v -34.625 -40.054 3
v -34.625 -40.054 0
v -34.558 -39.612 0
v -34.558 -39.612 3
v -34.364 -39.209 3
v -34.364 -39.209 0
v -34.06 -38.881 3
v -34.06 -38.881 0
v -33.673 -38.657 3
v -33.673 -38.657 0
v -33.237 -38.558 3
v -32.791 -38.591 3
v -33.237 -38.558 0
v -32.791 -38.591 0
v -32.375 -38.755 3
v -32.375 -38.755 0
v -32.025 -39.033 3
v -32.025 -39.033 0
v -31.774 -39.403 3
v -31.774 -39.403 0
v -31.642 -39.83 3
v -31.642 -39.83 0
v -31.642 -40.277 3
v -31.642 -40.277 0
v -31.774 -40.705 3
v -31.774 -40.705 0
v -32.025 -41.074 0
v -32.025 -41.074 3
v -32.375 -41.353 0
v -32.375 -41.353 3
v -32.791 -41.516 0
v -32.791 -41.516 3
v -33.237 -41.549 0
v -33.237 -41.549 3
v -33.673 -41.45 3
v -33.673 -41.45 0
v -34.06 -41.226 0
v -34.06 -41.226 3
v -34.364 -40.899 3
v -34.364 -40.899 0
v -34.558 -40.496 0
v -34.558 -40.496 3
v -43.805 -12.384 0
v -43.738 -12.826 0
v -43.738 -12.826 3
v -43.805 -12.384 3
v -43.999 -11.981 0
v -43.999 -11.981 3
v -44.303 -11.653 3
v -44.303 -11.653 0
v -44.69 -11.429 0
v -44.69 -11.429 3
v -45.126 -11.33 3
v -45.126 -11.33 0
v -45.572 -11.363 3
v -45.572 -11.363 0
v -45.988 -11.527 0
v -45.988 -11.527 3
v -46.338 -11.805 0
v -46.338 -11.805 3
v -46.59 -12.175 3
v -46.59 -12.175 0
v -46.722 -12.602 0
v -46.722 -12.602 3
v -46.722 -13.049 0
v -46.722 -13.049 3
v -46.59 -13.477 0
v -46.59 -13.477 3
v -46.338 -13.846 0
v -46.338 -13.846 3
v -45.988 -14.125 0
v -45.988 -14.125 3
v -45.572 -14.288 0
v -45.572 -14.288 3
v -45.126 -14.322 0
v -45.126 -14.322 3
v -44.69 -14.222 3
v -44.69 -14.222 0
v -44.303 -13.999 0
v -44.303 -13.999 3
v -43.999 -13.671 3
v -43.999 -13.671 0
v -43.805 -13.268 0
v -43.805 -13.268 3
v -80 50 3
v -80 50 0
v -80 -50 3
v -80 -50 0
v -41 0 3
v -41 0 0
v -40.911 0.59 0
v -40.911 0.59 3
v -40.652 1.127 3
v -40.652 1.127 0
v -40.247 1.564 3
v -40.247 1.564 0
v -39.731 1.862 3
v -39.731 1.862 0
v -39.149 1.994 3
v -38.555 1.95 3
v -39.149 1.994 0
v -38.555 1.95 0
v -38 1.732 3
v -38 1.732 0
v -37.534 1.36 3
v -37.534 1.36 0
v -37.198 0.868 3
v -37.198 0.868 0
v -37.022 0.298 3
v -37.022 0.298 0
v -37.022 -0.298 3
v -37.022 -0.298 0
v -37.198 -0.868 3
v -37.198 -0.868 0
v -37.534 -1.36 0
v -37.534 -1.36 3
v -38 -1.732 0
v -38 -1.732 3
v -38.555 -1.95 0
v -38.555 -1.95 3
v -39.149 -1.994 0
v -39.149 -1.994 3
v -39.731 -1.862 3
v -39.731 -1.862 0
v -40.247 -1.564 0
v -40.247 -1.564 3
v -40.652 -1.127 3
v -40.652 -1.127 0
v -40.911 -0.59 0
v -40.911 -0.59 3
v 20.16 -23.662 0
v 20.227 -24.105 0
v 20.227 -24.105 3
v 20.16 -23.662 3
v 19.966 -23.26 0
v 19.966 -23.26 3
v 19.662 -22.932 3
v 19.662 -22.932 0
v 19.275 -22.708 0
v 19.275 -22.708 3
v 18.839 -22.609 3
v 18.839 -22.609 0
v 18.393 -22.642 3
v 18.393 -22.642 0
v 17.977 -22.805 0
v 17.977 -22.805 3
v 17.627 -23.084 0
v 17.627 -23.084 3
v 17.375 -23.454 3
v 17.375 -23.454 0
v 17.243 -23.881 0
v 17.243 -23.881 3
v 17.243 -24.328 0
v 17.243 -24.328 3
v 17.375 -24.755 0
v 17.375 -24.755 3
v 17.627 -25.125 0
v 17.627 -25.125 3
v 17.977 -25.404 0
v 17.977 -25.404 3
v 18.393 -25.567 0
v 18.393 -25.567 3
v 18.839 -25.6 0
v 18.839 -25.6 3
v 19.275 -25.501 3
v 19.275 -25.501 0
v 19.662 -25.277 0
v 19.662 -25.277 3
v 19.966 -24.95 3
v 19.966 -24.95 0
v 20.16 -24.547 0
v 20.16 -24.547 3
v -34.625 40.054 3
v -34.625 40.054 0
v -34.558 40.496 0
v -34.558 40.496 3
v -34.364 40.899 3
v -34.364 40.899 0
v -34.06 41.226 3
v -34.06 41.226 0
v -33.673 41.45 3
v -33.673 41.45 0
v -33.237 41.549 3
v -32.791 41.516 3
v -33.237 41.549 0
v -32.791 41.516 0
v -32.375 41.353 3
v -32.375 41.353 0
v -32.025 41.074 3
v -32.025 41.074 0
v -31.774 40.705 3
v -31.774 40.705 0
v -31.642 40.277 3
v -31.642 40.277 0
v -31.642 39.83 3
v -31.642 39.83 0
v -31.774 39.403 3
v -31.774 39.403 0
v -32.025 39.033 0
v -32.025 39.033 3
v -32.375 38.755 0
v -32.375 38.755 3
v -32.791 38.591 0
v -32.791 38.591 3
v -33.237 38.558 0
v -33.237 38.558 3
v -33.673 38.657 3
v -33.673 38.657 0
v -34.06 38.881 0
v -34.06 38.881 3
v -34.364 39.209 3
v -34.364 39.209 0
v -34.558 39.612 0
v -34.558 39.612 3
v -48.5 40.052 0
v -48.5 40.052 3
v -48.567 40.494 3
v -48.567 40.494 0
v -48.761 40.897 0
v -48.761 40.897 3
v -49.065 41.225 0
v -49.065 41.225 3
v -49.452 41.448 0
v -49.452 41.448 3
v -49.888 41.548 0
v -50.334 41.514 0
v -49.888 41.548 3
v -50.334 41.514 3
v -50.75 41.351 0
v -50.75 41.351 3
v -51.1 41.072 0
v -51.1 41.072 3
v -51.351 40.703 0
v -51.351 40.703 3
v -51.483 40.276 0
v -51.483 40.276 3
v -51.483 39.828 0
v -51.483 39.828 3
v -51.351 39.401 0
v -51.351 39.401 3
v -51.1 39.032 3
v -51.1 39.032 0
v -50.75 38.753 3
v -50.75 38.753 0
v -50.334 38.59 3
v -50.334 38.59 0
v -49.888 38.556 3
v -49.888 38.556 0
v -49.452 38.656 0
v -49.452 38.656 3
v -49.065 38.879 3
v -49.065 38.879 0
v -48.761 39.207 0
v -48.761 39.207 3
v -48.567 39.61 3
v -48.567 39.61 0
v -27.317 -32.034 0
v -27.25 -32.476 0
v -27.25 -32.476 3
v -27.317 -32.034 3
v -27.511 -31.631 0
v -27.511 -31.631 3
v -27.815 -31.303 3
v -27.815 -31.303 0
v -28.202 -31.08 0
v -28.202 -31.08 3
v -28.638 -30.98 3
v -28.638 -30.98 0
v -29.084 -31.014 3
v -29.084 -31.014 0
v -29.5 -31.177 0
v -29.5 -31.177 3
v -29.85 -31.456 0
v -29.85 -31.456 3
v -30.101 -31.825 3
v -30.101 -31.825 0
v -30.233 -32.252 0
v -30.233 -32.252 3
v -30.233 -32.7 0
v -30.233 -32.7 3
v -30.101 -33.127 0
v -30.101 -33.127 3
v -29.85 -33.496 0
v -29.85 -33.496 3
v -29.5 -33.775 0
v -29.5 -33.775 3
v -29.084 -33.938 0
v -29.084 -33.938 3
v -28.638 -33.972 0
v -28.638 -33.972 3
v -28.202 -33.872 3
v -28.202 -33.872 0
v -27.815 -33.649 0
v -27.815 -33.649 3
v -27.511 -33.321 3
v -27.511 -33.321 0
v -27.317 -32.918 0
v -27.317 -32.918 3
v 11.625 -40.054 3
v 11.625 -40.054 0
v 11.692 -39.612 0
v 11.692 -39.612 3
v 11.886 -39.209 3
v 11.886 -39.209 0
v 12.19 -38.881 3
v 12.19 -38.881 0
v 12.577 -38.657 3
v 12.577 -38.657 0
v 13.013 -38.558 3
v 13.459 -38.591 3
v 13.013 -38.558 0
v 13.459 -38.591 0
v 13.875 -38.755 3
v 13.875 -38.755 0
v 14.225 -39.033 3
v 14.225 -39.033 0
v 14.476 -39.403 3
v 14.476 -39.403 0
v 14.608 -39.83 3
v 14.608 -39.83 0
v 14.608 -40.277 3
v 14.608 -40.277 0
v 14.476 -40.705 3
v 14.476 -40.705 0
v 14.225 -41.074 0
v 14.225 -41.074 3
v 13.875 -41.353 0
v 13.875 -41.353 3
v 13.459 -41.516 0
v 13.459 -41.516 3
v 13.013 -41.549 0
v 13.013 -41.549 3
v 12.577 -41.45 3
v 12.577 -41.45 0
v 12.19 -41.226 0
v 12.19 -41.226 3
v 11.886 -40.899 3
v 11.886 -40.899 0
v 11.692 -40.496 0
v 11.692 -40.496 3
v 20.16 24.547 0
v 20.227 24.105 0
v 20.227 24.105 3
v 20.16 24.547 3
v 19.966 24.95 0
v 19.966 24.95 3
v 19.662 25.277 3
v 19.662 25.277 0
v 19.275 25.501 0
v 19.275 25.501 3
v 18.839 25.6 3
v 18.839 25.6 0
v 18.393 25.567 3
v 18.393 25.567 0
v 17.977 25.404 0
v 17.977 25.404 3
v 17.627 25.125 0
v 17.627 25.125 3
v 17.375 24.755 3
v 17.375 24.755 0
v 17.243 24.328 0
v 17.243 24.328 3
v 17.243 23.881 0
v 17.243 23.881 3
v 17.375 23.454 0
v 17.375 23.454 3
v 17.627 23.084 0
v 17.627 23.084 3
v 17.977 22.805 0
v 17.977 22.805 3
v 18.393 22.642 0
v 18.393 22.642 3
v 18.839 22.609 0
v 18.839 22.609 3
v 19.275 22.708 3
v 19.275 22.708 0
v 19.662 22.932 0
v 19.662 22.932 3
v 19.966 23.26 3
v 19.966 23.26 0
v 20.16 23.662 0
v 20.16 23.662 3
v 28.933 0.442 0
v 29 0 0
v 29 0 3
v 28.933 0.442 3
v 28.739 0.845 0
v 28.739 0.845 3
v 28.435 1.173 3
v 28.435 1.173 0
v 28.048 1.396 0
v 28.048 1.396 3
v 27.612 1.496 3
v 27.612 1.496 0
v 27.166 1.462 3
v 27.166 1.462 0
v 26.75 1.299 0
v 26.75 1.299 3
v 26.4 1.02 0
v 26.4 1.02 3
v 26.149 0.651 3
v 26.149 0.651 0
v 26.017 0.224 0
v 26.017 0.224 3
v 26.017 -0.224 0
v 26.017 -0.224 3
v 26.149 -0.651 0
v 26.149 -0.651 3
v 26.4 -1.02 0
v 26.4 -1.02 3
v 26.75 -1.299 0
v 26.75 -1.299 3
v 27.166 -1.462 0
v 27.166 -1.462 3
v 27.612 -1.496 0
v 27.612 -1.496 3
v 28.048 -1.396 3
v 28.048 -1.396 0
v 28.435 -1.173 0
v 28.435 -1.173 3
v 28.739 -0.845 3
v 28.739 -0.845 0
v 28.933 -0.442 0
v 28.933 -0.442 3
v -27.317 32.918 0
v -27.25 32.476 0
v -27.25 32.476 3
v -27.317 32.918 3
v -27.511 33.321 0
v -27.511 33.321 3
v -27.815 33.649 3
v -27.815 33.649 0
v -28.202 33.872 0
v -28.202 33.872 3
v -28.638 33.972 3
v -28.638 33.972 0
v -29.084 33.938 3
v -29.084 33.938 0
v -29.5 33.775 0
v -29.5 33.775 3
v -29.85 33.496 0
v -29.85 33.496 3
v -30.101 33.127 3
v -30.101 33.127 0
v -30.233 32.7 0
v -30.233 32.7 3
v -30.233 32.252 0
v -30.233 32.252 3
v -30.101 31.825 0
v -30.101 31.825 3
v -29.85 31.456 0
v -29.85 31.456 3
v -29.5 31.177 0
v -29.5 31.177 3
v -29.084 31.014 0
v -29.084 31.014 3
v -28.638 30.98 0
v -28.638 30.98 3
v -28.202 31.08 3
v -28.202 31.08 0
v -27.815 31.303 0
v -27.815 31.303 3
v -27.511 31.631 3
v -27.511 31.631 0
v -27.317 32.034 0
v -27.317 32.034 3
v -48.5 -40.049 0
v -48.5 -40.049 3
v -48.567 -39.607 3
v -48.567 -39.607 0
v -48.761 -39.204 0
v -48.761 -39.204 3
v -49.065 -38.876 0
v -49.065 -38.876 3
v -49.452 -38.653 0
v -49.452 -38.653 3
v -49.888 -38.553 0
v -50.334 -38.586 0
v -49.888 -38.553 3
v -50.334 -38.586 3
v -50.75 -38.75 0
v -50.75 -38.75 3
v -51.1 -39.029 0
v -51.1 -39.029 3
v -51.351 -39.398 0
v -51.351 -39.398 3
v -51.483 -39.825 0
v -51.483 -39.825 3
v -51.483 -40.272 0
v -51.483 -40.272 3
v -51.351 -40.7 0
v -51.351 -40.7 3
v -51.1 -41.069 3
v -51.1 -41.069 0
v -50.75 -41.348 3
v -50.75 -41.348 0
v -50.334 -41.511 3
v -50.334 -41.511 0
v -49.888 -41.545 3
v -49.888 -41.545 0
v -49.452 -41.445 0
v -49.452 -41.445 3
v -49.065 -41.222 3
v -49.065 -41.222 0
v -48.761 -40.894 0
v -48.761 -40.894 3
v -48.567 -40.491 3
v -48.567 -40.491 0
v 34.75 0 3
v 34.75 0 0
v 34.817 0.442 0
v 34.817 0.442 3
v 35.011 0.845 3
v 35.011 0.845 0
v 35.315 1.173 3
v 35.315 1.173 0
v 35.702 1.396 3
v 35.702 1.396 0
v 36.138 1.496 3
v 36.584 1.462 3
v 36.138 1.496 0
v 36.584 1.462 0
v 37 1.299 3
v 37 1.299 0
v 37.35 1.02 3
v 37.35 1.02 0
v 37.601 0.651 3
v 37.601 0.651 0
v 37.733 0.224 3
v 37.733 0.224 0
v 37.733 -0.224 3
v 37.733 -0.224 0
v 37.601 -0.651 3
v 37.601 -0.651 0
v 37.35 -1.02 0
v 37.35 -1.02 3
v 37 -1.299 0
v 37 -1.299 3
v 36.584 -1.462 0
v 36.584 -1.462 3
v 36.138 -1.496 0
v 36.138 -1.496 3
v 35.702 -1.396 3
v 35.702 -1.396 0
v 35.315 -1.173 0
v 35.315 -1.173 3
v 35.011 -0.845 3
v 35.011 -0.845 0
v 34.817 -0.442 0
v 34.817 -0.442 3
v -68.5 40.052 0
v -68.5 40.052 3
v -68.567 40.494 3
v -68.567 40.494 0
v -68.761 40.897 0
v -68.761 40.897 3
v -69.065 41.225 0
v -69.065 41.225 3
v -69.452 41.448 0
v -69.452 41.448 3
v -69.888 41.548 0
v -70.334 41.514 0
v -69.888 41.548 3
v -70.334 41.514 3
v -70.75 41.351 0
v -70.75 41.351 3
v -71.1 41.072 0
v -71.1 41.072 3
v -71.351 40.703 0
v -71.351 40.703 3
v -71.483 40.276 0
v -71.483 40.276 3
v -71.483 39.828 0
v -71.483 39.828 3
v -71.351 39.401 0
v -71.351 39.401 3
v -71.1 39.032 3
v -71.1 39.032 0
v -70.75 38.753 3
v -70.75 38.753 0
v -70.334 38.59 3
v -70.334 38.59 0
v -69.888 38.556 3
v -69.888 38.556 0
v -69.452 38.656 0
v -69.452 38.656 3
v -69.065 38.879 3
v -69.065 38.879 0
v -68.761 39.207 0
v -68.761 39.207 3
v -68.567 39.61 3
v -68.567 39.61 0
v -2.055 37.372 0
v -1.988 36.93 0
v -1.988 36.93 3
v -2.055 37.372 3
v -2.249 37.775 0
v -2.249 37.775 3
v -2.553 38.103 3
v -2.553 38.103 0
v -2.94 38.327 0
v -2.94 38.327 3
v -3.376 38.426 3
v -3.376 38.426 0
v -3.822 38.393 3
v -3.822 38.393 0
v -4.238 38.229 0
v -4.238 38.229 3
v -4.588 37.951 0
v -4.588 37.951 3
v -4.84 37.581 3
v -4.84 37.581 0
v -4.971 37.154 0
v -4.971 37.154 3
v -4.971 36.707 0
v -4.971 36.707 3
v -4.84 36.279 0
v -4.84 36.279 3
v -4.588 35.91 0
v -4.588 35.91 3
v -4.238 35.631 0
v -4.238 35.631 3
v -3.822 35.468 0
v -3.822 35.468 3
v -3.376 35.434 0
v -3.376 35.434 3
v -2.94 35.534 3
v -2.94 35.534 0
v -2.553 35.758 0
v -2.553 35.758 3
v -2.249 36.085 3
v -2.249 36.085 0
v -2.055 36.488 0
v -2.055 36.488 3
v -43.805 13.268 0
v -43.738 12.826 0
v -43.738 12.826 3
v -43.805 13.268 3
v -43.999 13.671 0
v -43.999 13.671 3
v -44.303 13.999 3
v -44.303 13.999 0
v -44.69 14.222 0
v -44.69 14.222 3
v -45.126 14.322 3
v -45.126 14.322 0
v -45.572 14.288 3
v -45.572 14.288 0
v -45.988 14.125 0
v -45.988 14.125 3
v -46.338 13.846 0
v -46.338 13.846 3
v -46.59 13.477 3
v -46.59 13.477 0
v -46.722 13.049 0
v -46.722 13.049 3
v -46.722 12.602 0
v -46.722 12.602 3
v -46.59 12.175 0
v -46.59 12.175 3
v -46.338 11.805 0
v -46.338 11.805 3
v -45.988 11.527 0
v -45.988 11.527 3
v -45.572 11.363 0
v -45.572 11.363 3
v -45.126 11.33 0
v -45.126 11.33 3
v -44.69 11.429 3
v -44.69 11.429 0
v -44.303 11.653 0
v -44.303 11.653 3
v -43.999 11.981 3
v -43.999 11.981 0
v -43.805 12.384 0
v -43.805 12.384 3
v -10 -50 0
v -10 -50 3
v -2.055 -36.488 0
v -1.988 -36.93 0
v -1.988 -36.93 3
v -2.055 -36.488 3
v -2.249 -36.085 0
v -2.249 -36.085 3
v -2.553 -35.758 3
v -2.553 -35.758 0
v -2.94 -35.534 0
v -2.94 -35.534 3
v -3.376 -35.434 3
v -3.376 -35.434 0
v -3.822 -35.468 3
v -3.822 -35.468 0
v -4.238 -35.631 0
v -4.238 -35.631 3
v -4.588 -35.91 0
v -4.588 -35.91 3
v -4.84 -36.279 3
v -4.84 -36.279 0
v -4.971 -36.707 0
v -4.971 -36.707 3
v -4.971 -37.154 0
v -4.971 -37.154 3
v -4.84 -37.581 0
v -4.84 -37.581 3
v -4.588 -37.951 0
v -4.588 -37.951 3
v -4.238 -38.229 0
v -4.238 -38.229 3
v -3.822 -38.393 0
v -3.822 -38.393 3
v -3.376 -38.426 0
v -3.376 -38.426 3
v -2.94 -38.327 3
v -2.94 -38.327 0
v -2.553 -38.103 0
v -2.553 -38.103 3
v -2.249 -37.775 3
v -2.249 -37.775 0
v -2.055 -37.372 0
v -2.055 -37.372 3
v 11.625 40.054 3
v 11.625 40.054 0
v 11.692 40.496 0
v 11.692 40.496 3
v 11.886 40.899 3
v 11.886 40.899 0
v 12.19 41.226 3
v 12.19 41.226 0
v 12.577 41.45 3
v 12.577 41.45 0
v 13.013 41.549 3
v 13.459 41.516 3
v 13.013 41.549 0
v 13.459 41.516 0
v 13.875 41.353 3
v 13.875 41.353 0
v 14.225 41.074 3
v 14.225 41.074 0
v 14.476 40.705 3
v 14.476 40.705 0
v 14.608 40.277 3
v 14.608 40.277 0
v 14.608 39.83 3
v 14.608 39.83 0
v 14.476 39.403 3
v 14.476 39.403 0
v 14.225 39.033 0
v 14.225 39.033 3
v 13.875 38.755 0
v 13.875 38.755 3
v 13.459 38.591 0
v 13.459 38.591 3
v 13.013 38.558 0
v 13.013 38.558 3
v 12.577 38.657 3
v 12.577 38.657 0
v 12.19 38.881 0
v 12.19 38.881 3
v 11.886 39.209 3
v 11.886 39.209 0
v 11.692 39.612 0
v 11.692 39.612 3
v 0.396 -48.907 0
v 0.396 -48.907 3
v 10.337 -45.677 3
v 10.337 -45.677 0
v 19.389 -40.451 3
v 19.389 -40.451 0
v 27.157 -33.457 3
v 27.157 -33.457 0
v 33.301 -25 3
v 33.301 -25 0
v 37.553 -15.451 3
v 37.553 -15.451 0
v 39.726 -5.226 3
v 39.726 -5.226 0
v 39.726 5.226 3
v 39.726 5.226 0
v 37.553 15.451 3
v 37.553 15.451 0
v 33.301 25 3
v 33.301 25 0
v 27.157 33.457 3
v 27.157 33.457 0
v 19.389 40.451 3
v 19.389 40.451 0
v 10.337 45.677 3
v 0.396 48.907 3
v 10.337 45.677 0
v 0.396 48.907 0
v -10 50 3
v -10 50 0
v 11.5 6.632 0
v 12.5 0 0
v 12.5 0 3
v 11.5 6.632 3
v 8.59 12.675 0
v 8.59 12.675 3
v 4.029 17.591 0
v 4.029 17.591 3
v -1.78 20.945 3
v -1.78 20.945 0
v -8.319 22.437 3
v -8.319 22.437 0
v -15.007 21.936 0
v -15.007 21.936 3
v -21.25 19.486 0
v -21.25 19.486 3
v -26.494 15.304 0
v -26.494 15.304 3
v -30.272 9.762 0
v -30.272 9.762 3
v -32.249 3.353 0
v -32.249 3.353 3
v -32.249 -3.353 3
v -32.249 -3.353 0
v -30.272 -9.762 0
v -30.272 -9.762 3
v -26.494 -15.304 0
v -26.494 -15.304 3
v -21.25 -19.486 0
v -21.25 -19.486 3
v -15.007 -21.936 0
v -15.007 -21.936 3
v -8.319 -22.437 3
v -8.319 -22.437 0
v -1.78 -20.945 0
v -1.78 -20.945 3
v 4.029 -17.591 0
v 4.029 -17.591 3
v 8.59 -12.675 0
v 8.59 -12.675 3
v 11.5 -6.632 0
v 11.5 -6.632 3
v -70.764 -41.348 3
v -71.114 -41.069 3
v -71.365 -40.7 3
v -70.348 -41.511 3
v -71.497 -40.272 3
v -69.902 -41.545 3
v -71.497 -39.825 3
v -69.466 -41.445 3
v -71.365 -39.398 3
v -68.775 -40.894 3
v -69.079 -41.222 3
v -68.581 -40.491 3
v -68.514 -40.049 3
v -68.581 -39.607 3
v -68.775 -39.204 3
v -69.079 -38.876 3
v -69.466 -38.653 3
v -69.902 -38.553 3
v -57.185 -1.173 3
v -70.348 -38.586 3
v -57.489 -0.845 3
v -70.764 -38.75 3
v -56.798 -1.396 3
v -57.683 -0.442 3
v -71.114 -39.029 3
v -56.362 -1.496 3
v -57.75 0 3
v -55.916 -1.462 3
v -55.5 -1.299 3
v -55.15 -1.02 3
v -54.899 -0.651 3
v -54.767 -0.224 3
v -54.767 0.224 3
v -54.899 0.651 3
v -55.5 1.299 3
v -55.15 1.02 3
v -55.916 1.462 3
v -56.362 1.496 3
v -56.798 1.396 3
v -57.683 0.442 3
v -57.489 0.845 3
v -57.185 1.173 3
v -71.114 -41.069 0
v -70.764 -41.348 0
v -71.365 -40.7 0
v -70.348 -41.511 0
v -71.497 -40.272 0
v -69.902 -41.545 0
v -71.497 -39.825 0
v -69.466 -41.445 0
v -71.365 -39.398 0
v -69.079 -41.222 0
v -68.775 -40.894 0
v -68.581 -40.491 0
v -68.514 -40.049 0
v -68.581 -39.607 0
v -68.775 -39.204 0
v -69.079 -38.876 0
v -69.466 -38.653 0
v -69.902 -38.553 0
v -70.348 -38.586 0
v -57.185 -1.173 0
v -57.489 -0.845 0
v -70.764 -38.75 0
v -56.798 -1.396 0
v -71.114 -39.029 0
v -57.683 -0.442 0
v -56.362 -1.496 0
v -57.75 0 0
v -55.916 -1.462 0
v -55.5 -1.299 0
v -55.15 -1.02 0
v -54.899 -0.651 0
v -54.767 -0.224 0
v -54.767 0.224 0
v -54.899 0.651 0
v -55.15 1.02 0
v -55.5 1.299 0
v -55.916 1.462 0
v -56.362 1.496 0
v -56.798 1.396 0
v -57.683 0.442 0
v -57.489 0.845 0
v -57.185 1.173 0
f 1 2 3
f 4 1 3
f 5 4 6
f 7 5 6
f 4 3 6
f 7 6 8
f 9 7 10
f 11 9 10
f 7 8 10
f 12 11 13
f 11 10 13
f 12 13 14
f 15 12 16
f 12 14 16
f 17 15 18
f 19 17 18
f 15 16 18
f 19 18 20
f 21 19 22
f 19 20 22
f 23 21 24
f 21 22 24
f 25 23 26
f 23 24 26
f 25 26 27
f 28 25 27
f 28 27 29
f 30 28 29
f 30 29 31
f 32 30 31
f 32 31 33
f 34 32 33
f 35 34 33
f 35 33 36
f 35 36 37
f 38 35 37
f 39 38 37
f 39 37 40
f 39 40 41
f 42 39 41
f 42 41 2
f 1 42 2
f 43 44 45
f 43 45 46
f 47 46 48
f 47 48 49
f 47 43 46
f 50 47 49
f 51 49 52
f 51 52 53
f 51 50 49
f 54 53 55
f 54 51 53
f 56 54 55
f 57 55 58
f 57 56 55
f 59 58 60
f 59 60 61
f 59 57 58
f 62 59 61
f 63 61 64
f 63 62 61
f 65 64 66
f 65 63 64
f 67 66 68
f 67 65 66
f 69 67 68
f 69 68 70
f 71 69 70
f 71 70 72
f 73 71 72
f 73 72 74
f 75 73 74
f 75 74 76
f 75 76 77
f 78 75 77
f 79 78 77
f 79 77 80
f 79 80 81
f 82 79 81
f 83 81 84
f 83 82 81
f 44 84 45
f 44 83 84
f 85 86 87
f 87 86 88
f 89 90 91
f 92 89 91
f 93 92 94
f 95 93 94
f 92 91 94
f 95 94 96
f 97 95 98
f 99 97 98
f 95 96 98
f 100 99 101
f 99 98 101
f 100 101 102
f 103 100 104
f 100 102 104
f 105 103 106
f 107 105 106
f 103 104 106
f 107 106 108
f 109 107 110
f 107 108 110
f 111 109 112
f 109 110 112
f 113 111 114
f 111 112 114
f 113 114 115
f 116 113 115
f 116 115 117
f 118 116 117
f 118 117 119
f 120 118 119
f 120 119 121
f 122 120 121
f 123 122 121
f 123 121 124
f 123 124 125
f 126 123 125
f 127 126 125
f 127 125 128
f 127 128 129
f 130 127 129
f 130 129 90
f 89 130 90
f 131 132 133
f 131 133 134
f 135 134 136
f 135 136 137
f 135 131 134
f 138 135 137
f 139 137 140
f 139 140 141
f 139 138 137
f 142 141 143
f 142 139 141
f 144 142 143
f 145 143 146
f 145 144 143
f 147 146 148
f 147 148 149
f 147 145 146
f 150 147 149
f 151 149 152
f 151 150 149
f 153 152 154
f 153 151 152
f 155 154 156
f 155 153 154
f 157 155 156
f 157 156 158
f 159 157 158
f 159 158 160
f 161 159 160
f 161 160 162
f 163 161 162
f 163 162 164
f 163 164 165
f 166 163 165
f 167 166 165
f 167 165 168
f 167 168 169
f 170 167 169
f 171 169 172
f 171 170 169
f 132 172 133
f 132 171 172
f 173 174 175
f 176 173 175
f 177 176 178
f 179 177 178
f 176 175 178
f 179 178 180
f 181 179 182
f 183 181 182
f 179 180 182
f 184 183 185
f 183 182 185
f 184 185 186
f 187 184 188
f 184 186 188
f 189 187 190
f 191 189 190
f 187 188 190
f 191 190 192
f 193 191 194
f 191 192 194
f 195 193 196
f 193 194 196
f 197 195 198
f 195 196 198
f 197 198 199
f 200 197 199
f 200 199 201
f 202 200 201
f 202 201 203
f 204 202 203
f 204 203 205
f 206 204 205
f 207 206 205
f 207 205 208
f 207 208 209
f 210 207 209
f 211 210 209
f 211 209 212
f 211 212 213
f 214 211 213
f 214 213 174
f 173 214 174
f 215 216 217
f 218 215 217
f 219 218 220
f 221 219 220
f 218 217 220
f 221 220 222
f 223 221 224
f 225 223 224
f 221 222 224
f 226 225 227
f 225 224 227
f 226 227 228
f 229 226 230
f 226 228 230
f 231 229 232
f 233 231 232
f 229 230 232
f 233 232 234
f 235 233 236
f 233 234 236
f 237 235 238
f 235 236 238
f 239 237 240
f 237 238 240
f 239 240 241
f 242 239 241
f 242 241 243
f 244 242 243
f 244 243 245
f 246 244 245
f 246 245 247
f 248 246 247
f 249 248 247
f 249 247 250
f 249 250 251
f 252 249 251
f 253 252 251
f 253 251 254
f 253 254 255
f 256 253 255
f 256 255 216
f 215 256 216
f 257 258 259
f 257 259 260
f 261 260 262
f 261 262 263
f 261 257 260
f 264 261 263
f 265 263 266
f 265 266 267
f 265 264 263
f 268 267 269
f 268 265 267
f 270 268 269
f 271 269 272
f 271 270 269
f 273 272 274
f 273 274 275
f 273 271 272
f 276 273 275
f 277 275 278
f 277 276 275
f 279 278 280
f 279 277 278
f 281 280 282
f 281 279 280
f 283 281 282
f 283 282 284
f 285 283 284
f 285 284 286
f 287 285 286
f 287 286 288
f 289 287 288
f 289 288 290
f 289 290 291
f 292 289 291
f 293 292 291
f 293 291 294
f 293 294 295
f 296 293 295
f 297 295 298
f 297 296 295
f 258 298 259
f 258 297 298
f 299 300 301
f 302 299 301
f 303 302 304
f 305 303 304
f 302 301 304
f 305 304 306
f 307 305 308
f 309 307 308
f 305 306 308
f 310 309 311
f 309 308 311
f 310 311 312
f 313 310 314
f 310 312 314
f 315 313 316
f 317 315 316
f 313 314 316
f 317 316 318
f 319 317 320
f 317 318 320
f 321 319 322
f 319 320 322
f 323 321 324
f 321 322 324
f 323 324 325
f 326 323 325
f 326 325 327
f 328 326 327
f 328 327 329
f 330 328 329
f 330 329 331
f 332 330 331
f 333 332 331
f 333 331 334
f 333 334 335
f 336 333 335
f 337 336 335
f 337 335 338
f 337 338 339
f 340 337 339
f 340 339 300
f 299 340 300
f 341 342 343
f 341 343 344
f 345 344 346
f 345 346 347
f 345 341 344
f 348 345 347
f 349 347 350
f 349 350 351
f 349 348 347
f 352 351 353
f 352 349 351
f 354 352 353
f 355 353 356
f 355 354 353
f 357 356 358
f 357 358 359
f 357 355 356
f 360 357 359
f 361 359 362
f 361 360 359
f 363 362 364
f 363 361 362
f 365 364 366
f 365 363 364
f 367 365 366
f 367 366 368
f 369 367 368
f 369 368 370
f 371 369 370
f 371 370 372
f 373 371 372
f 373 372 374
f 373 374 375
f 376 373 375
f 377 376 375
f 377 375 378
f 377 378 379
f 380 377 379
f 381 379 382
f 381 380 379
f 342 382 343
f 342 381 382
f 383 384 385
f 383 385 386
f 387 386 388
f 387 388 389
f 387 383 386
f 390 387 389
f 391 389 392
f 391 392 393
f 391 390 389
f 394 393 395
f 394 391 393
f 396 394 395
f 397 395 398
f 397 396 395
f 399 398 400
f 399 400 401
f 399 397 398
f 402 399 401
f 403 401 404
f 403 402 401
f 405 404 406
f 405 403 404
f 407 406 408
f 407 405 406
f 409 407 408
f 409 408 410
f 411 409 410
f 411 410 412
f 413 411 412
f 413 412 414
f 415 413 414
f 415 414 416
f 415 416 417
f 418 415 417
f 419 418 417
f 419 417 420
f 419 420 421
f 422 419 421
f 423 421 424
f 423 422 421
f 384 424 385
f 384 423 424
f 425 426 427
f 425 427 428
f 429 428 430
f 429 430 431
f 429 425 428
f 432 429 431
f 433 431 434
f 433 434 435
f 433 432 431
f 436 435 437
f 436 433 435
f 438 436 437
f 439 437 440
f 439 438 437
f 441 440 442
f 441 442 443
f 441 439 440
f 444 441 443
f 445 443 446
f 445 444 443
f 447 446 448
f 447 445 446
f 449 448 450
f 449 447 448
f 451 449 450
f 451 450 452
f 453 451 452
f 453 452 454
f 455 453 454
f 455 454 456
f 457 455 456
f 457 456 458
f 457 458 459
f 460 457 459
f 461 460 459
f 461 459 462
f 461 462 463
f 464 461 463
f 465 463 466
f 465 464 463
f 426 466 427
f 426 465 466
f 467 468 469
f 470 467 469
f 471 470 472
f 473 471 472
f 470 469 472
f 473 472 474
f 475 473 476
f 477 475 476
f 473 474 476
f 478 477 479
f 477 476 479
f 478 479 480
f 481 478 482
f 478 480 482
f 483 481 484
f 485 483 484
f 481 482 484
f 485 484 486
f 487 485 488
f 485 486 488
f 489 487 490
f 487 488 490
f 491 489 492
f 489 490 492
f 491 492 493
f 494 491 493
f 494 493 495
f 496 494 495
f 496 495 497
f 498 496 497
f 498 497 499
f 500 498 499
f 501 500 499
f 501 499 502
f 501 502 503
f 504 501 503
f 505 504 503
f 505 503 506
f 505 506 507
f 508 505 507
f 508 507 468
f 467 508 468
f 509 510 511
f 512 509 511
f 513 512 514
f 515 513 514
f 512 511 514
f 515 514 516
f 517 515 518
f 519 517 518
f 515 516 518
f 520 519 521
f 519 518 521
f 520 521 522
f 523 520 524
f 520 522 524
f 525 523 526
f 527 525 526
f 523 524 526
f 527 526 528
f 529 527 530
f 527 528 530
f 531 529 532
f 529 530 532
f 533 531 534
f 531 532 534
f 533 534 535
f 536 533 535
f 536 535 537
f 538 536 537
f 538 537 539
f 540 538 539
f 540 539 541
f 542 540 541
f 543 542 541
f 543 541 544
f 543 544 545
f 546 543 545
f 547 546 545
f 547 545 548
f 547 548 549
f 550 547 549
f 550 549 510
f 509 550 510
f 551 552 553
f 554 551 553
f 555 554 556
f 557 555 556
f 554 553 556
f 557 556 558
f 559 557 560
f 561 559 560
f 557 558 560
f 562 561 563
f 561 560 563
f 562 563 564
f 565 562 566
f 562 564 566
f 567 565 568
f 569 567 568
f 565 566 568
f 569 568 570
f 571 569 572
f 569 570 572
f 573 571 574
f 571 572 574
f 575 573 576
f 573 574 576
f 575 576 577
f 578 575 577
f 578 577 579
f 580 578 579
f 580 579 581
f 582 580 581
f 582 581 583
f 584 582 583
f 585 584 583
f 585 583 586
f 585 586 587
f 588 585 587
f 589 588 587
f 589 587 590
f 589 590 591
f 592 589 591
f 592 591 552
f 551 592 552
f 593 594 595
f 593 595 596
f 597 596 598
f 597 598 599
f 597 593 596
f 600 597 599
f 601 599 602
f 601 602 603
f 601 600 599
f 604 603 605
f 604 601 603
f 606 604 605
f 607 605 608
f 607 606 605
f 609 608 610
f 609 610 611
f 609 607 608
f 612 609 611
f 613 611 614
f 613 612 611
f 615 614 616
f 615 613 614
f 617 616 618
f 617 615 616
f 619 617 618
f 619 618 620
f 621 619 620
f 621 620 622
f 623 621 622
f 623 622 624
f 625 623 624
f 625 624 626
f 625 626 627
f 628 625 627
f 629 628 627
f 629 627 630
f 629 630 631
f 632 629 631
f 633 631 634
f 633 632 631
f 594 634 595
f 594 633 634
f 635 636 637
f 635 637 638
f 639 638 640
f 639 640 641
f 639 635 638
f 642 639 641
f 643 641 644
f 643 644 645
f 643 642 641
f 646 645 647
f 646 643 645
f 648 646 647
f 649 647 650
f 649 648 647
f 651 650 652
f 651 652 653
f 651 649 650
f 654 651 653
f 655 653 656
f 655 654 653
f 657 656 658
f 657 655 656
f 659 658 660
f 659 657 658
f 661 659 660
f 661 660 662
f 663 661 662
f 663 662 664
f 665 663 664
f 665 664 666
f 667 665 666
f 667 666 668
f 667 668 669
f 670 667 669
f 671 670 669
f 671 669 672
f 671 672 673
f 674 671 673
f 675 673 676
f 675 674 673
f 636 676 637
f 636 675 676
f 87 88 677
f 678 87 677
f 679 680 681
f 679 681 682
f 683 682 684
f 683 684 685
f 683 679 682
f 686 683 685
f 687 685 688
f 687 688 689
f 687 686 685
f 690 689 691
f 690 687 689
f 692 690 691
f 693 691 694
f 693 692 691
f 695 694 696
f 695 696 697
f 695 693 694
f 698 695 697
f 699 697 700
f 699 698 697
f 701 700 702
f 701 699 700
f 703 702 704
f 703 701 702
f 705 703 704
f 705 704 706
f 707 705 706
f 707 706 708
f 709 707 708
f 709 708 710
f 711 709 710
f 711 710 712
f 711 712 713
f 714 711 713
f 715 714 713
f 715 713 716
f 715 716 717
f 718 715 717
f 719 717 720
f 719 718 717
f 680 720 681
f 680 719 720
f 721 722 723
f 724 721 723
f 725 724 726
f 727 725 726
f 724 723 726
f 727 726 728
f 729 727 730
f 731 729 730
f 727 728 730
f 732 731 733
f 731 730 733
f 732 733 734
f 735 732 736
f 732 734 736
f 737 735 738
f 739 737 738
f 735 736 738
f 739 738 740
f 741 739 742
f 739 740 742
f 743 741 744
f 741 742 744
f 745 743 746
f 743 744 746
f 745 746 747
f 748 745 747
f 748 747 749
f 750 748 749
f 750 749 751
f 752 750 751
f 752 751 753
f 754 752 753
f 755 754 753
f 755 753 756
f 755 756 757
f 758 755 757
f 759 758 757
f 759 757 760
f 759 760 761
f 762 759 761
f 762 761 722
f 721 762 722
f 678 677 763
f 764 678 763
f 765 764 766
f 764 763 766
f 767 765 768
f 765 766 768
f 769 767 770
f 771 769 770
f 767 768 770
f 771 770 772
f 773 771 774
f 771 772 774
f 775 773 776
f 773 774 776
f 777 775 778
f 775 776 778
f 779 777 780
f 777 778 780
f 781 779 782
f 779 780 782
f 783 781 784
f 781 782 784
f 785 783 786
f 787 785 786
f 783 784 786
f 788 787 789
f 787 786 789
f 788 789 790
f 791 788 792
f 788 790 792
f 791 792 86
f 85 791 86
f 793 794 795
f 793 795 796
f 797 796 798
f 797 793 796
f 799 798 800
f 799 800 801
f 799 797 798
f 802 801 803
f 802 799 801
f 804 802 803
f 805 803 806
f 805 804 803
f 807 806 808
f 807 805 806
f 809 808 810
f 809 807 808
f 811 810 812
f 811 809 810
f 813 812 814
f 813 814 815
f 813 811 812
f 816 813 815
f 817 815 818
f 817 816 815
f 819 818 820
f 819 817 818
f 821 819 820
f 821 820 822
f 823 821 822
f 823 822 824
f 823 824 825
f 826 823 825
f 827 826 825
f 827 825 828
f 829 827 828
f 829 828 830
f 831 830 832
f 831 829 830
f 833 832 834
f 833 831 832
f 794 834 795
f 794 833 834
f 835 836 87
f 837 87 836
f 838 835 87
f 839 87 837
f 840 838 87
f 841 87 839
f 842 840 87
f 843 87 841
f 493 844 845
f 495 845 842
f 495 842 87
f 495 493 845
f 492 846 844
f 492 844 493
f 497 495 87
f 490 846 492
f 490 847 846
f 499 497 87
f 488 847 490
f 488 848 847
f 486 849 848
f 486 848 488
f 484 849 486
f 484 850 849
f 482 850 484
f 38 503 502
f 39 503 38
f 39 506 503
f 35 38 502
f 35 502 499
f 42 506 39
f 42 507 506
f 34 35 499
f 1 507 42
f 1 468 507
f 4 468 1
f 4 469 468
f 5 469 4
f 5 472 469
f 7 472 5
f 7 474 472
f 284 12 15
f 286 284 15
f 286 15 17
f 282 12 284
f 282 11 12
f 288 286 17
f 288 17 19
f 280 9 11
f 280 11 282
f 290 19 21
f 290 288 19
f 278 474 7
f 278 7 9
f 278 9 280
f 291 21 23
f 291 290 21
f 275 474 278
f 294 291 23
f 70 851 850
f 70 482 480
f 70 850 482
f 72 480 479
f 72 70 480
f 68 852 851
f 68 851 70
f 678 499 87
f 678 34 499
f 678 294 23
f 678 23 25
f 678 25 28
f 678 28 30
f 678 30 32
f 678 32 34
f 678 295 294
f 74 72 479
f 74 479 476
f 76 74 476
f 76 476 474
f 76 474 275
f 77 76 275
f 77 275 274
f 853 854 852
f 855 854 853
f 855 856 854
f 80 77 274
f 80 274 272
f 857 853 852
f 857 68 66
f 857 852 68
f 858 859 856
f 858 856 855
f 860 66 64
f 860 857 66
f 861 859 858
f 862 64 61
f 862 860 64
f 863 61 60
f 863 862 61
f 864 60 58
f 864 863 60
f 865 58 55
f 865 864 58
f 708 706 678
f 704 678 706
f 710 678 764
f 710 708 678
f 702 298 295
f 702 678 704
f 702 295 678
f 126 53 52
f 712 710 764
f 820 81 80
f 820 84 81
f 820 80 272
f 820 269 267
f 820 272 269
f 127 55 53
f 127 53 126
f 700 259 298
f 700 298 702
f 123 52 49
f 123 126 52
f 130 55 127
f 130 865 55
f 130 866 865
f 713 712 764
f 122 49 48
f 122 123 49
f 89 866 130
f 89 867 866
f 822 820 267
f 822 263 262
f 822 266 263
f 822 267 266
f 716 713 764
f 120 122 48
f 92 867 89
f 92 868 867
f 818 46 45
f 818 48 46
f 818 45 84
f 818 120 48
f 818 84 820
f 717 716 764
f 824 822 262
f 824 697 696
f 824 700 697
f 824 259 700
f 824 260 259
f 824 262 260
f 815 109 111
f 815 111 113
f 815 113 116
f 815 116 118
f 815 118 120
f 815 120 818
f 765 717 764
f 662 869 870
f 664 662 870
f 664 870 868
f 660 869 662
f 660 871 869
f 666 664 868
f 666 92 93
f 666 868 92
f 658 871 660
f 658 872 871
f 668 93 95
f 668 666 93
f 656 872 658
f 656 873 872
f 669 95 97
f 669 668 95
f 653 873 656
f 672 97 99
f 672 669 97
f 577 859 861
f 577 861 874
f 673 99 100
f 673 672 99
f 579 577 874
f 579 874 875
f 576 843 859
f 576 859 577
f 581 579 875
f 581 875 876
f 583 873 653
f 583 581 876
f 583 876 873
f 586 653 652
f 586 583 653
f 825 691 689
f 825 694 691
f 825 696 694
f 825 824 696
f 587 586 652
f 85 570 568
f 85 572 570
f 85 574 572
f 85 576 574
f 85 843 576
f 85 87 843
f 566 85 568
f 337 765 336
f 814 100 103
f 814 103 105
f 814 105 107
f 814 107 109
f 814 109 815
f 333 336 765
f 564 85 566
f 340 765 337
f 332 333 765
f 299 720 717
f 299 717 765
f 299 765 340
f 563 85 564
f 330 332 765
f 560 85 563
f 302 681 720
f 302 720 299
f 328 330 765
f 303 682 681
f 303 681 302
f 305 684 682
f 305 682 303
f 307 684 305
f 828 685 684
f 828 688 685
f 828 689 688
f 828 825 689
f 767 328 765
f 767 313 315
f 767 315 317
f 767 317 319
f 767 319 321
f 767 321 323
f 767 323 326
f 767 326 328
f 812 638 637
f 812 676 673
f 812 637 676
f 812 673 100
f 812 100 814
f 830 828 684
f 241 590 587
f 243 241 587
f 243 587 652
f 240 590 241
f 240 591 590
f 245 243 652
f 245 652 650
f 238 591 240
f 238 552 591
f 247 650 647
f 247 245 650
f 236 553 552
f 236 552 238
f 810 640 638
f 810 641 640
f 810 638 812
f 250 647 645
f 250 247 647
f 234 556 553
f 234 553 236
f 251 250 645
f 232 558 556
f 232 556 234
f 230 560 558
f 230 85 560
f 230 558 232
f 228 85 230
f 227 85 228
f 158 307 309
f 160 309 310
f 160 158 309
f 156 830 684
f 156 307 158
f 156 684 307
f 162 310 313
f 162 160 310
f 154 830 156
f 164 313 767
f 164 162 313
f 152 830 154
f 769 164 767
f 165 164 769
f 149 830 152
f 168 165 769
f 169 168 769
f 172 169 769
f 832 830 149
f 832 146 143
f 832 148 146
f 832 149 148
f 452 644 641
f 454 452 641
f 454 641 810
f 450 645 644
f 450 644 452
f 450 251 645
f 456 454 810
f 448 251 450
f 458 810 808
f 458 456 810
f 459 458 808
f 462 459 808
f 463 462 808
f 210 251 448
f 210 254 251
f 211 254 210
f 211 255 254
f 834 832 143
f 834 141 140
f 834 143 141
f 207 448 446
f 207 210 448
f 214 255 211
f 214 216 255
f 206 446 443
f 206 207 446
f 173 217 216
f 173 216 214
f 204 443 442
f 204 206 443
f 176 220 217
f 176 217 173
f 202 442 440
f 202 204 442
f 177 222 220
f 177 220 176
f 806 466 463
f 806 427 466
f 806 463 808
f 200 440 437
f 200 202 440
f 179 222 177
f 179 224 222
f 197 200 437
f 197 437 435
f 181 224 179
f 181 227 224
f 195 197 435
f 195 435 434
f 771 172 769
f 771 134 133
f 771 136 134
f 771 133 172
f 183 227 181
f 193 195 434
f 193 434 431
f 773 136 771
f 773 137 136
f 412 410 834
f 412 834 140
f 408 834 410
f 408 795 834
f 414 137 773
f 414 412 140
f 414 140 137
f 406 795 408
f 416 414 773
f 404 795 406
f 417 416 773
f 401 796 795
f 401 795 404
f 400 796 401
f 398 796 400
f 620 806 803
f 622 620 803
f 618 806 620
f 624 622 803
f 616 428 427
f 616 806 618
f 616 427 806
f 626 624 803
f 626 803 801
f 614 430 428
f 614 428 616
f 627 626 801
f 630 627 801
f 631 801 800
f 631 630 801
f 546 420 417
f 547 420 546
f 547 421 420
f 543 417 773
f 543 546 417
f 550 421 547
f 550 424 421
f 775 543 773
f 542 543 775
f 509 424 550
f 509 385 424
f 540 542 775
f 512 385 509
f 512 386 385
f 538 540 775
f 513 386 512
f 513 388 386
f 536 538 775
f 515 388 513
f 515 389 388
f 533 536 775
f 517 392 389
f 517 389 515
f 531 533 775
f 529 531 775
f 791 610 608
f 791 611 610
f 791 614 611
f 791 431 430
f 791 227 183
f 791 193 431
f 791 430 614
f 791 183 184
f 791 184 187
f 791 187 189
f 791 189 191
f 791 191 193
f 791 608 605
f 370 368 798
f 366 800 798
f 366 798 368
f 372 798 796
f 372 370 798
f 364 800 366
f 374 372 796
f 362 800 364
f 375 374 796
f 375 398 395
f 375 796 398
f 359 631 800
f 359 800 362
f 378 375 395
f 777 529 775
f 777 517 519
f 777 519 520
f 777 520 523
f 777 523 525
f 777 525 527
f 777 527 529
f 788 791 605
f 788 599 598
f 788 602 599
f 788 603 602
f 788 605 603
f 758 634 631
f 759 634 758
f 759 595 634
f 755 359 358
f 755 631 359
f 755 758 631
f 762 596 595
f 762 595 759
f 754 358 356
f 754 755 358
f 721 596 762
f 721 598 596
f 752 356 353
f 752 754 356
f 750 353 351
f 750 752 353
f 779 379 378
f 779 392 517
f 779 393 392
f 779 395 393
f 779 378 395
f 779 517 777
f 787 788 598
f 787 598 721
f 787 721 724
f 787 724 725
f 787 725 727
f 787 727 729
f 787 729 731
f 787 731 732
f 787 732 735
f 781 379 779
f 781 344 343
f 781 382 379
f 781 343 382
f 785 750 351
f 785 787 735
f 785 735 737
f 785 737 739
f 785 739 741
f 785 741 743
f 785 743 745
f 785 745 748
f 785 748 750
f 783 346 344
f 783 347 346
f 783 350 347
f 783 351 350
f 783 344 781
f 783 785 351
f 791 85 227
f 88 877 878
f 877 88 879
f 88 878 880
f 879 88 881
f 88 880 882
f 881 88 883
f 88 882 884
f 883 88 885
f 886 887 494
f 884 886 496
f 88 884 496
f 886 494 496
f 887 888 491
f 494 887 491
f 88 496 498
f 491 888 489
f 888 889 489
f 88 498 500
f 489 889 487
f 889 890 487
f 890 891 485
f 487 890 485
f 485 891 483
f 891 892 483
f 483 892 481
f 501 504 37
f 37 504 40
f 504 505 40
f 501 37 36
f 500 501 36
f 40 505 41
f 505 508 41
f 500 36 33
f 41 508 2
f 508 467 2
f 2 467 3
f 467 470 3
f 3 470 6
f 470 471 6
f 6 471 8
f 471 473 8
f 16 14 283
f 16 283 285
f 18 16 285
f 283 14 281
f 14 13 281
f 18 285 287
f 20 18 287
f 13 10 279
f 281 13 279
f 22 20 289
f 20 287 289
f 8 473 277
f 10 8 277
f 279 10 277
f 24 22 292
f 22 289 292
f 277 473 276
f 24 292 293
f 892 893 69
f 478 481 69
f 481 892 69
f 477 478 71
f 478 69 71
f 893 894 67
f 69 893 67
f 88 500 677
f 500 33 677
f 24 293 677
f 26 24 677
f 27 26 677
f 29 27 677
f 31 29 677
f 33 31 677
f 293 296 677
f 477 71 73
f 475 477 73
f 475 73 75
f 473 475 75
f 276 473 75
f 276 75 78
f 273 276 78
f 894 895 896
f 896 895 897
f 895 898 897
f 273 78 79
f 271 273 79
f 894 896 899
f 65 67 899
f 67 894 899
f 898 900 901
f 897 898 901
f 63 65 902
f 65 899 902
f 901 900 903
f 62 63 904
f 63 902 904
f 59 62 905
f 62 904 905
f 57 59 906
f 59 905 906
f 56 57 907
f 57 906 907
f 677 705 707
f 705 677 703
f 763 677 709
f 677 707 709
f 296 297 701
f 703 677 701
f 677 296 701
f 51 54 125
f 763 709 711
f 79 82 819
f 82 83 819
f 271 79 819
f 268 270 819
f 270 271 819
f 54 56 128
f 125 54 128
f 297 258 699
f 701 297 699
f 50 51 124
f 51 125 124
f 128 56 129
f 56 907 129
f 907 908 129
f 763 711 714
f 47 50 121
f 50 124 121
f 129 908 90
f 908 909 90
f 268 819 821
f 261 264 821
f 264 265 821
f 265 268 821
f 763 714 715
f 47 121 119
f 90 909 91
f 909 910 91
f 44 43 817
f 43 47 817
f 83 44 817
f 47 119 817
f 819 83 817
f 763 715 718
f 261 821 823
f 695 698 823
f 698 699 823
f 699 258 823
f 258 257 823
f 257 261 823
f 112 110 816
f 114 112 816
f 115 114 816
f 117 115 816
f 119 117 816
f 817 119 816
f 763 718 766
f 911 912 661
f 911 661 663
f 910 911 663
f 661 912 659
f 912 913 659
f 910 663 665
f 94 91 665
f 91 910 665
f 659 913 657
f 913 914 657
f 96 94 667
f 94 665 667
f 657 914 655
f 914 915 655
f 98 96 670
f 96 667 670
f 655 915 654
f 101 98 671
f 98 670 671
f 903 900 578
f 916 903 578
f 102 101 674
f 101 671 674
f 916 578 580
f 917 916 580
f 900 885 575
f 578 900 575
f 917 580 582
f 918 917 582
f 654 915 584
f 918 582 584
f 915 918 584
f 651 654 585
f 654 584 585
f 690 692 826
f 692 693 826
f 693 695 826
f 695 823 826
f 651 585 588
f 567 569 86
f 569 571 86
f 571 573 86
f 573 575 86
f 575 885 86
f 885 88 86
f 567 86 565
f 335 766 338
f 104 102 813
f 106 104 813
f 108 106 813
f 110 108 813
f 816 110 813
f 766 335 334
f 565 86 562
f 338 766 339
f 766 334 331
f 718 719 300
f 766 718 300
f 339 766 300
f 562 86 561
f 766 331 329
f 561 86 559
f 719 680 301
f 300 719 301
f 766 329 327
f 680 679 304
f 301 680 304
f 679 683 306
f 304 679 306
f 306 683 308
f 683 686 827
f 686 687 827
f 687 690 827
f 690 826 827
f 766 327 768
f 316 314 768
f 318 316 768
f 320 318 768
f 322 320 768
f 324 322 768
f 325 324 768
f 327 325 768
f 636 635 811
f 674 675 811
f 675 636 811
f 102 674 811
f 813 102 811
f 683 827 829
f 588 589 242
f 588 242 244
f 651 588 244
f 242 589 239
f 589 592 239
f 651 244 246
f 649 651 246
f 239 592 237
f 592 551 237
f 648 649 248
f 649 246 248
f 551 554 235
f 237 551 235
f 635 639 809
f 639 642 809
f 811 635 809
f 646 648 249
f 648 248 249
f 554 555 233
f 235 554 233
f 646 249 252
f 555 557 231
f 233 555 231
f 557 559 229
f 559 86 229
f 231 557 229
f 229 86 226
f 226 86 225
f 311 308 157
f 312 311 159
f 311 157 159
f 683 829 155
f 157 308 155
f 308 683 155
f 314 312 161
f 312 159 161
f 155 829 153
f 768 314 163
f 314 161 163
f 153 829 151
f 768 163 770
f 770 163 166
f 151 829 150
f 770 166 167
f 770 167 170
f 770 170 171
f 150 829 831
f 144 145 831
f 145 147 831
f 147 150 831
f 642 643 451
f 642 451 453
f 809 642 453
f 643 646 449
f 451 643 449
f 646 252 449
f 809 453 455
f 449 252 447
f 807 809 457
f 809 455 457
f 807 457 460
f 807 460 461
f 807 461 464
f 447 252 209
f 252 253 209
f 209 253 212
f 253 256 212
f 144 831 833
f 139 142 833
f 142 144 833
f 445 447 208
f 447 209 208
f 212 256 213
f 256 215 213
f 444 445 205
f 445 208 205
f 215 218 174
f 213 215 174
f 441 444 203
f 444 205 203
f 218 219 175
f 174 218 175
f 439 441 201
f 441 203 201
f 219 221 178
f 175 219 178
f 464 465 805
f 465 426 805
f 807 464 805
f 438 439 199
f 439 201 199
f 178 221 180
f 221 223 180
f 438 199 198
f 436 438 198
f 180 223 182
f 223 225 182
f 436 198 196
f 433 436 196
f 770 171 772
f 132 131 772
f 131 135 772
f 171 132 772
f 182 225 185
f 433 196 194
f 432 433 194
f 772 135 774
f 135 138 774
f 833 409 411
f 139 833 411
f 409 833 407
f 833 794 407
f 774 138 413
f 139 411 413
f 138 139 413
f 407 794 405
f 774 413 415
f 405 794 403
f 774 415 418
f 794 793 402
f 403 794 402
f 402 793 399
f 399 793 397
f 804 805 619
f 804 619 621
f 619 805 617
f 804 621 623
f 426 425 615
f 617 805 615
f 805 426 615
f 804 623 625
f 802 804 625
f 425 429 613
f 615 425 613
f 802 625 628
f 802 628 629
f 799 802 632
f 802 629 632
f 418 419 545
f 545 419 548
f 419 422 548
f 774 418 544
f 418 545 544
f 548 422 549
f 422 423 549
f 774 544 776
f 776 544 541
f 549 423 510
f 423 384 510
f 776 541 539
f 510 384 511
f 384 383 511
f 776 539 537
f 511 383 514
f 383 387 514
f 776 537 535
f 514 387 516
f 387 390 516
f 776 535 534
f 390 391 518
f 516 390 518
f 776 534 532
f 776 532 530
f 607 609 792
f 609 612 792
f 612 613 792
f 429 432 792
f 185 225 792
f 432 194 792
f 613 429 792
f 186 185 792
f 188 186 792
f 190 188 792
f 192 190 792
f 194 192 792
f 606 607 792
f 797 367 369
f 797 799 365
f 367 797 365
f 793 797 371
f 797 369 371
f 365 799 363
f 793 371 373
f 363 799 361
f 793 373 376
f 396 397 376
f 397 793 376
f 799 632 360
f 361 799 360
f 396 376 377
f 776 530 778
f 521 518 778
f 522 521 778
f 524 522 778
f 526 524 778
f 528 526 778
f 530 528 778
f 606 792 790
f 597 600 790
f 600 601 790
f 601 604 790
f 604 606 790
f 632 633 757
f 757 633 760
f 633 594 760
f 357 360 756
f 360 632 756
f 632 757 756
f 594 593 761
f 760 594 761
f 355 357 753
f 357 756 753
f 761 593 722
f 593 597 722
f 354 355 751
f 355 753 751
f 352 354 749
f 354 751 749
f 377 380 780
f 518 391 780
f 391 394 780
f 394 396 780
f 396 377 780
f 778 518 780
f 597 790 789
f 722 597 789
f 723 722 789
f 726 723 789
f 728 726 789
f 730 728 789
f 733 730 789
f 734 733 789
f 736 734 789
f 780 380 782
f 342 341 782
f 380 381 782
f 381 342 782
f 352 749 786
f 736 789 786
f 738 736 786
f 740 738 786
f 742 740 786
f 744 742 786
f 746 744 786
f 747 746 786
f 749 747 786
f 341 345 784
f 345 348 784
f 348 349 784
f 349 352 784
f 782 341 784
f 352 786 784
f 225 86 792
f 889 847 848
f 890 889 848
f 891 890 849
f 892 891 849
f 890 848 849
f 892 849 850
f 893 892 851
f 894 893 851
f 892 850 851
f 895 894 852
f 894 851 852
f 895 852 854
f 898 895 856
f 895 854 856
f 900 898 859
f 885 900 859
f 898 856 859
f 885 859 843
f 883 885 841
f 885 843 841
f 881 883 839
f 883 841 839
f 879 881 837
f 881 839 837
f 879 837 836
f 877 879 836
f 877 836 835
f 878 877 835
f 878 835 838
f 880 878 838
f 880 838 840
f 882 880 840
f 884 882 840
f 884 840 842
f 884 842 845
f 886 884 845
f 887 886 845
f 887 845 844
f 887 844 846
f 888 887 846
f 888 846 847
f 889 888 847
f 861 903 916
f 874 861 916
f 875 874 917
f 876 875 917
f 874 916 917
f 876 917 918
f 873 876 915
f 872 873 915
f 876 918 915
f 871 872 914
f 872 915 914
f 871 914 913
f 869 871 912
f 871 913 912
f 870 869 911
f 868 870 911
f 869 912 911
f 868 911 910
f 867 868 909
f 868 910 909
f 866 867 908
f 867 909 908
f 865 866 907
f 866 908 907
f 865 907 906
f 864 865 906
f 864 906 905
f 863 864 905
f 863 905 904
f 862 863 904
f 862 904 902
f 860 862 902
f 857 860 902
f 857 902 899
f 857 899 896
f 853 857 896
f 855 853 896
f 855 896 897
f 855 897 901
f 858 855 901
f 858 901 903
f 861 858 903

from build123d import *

# Parameters (mm, degrees)
SKETCH_1_R          = 1.5
SKETCH_1_R_2        = 22.5
EXTRUDE_1_DEPTH     = 3
SKETCH_2_R          = 2
SKETCH_2_R_2        = 1.75
CUT_EXTRUDE_1_DEPTH = 10
SKETCH_3_R          = 1.5
SKETCH_3_R_2        = 1.75
SKETCH_3_R_3        = 22.5
CUT_EXTRUDE_2_DEPTH = 10
SKETCH_4_R          = 1.5
CUT_EXTRUDE_3_DEPTH = 10
SKETCH_5_R          = 1.5
CUT_EXTRUDE_4_DEPTH = 95.387499172


with BuildPart() as part:
    # 草图1 → 凸台-拉伸1 (new body)
    with BuildSketch(Plane.XY):
        with BuildLine():
            Line((-10, 50), (-350, 50))
            ThreePointArc((-350, 50), (-400, 0), (-350, -50))
            Line((-350, -50), (-10, -50))
            ThreePointArc((-10, -50), (40, 0), (-10, 50))
        make_face()
        with Locations((-387.5, 0)):
            Circle(SKETCH_1_R, mode=Mode.SUBTRACT)
        with Locations((-378.726666617, 24.104535363)):
            Circle(SKETCH_1_R, mode=Mode.SUBTRACT)
        with Locations((-356.511806663, 36.930290738)):
            Circle(SKETCH_1_R, mode=Mode.SUBTRACT)
        with Locations((-331.25, 32.475952642)):
            Circle(SKETCH_1_R, mode=Mode.SUBTRACT)
        with Locations((-314.761526721, 12.825755375)):
            Circle(SKETCH_1_R, mode=Mode.SUBTRACT)
        with Locations((-314.761526721, -12.825755375)):
            Circle(SKETCH_1_R, mode=Mode.SUBTRACT)
        with Locations((-331.25, -32.475952642)):
            Circle(SKETCH_1_R, mode=Mode.SUBTRACT)
        with Locations((-356.511806663, -36.930290738)):
            Circle(SKETCH_1_R, mode=Mode.SUBTRACT)
        with Locations((-378.726666617, -24.104535363)):
            Circle(SKETCH_1_R, mode=Mode.SUBTRACT)
        with Locations((-350, 0)):
            Circle(SKETCH_1_R_2, mode=Mode.SUBTRACT)
        with Locations((-10, 0)):
            Circle(SKETCH_1_R_2, mode=Mode.SUBTRACT)
        with Locations((18.726666617, -24.104535363)):
            Circle(SKETCH_1_R, mode=Mode.SUBTRACT)
        with Locations((-3.488193337, -36.930290738)):
            Circle(SKETCH_1_R, mode=Mode.SUBTRACT)
        with Locations((-28.75, -32.475952642)):
            Circle(SKETCH_1_R, mode=Mode.SUBTRACT)
        with Locations((-45.238473279, -12.825755375)):
            Circle(SKETCH_1_R, mode=Mode.SUBTRACT)
        with Locations((-45.238473279, 12.825755375)):
            Circle(SKETCH_1_R, mode=Mode.SUBTRACT)
        with Locations((-28.75, 32.475952642)):
            Circle(SKETCH_1_R, mode=Mode.SUBTRACT)
        with Locations((-3.488193337, 36.930290738)):
            Circle(SKETCH_1_R, mode=Mode.SUBTRACT)
        with Locations((18.726666617, 24.104535363)):
            Circle(SKETCH_1_R, mode=Mode.SUBTRACT)
        with Locations((27.5, 0)):
            Circle(SKETCH_1_R, mode=Mode.SUBTRACT)
    extrude(amount=EXTRUDE_1_DEPTH)

    # 草图2 → 切除-拉伸1 (cut)
    with BuildSketch(Plane(origin=(0, 0, 0), x_dir=(-1, 0, 0), z_dir=(0, 0, -1))):
        with Locations((39, 0)):
            Circle(SKETCH_2_R)
        with Locations(Location((321, 0, 0), (0, 0, 180))):
            Circle(SKETCH_2_R_2)
    extrude(amount=-CUT_EXTRUDE_1_DEPTH, mode=Mode.SUBTRACT)

    # 草图3 → 切除-拉伸2 (cut)
    with BuildSketch(Plane(origin=(0, 0, 0), x_dir=(-1, 0, 0), z_dir=(0, 0, -1))):
        with BuildLine():
            Line((80, -50), (180, -50))
            Line((180, -50), (350, -50))
            ThreePointArc((350, -50), (400, 0), (350, 50))
            Line((350, 50), (80, 50))
            Line((80, 50), (80, -50))
        make_face()
        with Locations((331.25, -32.475952642)):
            Circle(SKETCH_3_R, mode=Mode.SUBTRACT)
        with Locations((356.511806663, -36.930290738)):
            Circle(SKETCH_3_R, mode=Mode.SUBTRACT)
        with Locations((378.726666617, -24.104535363)):
            Circle(SKETCH_3_R, mode=Mode.SUBTRACT)
        with Locations((314.761526721, -12.825755375)):
            Circle(SKETCH_3_R, mode=Mode.SUBTRACT)
        with Locations((321, 0)):
            Circle(SKETCH_3_R_2, mode=Mode.SUBTRACT)
        with Locations((314.761526721, 12.825755375)):
            Circle(SKETCH_3_R, mode=Mode.SUBTRACT)
        with Locations((350, 0)):
            Circle(SKETCH_3_R_3, mode=Mode.SUBTRACT)
        with Locations((387.5, 0)):
            Circle(SKETCH_3_R, mode=Mode.SUBTRACT)
        with Locations((331.25, 32.475952642)):
            Circle(SKETCH_3_R, mode=Mode.SUBTRACT)
        with Locations((378.726666617, 24.104535363)):
            Circle(SKETCH_3_R, mode=Mode.SUBTRACT)
        with Locations((356.511806663, 36.930290738)):
            Circle(SKETCH_3_R, mode=Mode.SUBTRACT)
    extrude(amount=-CUT_EXTRUDE_2_DEPTH, mode=Mode.SUBTRACT)

    # 草图4 → 切除-拉伸3 (cut)
    with BuildSketch(Plane(origin=(0, 0, 0), x_dir=(-1, 0, 0), z_dir=(0, 0, -1))):
        with Locations((-36.25, 0)):
            Circle(SKETCH_4_R)
        with Locations((-13.125, 40.053674925)):
            Circle(SKETCH_4_R)
        with Locations((33.125, 40.053674925)):
            Circle(SKETCH_4_R)
        with Locations((56.25, 0)):
            Circle(SKETCH_4_R)
        with Locations((33.125, -40.053674925)):
            Circle(SKETCH_4_R)
        with Locations((-13.125, -40.053674925)):
            Circle(SKETCH_4_R)
    extrude(amount=-CUT_EXTRUDE_3_DEPTH, mode=Mode.SUBTRACT)

    # 草图5 → 切除-拉伸4 (cut, through all)
    with BuildSketch(Plane.XY.offset(3)):
        with Locations((-70, 40.051993223)):
            Circle(SKETCH_5_R)
        with Locations((-50, 40.051993223)):
            Circle(SKETCH_5_R)
        with Locations((-70.013968461, -40.048849195)):
            Circle(SKETCH_5_R)
        with Locations((-50, -40.048849193)):
            Circle(SKETCH_5_R)
    extrude(amount=-CUT_EXTRUDE_4_DEPTH, mode=Mode.SUBTRACT)


solid = part.part
